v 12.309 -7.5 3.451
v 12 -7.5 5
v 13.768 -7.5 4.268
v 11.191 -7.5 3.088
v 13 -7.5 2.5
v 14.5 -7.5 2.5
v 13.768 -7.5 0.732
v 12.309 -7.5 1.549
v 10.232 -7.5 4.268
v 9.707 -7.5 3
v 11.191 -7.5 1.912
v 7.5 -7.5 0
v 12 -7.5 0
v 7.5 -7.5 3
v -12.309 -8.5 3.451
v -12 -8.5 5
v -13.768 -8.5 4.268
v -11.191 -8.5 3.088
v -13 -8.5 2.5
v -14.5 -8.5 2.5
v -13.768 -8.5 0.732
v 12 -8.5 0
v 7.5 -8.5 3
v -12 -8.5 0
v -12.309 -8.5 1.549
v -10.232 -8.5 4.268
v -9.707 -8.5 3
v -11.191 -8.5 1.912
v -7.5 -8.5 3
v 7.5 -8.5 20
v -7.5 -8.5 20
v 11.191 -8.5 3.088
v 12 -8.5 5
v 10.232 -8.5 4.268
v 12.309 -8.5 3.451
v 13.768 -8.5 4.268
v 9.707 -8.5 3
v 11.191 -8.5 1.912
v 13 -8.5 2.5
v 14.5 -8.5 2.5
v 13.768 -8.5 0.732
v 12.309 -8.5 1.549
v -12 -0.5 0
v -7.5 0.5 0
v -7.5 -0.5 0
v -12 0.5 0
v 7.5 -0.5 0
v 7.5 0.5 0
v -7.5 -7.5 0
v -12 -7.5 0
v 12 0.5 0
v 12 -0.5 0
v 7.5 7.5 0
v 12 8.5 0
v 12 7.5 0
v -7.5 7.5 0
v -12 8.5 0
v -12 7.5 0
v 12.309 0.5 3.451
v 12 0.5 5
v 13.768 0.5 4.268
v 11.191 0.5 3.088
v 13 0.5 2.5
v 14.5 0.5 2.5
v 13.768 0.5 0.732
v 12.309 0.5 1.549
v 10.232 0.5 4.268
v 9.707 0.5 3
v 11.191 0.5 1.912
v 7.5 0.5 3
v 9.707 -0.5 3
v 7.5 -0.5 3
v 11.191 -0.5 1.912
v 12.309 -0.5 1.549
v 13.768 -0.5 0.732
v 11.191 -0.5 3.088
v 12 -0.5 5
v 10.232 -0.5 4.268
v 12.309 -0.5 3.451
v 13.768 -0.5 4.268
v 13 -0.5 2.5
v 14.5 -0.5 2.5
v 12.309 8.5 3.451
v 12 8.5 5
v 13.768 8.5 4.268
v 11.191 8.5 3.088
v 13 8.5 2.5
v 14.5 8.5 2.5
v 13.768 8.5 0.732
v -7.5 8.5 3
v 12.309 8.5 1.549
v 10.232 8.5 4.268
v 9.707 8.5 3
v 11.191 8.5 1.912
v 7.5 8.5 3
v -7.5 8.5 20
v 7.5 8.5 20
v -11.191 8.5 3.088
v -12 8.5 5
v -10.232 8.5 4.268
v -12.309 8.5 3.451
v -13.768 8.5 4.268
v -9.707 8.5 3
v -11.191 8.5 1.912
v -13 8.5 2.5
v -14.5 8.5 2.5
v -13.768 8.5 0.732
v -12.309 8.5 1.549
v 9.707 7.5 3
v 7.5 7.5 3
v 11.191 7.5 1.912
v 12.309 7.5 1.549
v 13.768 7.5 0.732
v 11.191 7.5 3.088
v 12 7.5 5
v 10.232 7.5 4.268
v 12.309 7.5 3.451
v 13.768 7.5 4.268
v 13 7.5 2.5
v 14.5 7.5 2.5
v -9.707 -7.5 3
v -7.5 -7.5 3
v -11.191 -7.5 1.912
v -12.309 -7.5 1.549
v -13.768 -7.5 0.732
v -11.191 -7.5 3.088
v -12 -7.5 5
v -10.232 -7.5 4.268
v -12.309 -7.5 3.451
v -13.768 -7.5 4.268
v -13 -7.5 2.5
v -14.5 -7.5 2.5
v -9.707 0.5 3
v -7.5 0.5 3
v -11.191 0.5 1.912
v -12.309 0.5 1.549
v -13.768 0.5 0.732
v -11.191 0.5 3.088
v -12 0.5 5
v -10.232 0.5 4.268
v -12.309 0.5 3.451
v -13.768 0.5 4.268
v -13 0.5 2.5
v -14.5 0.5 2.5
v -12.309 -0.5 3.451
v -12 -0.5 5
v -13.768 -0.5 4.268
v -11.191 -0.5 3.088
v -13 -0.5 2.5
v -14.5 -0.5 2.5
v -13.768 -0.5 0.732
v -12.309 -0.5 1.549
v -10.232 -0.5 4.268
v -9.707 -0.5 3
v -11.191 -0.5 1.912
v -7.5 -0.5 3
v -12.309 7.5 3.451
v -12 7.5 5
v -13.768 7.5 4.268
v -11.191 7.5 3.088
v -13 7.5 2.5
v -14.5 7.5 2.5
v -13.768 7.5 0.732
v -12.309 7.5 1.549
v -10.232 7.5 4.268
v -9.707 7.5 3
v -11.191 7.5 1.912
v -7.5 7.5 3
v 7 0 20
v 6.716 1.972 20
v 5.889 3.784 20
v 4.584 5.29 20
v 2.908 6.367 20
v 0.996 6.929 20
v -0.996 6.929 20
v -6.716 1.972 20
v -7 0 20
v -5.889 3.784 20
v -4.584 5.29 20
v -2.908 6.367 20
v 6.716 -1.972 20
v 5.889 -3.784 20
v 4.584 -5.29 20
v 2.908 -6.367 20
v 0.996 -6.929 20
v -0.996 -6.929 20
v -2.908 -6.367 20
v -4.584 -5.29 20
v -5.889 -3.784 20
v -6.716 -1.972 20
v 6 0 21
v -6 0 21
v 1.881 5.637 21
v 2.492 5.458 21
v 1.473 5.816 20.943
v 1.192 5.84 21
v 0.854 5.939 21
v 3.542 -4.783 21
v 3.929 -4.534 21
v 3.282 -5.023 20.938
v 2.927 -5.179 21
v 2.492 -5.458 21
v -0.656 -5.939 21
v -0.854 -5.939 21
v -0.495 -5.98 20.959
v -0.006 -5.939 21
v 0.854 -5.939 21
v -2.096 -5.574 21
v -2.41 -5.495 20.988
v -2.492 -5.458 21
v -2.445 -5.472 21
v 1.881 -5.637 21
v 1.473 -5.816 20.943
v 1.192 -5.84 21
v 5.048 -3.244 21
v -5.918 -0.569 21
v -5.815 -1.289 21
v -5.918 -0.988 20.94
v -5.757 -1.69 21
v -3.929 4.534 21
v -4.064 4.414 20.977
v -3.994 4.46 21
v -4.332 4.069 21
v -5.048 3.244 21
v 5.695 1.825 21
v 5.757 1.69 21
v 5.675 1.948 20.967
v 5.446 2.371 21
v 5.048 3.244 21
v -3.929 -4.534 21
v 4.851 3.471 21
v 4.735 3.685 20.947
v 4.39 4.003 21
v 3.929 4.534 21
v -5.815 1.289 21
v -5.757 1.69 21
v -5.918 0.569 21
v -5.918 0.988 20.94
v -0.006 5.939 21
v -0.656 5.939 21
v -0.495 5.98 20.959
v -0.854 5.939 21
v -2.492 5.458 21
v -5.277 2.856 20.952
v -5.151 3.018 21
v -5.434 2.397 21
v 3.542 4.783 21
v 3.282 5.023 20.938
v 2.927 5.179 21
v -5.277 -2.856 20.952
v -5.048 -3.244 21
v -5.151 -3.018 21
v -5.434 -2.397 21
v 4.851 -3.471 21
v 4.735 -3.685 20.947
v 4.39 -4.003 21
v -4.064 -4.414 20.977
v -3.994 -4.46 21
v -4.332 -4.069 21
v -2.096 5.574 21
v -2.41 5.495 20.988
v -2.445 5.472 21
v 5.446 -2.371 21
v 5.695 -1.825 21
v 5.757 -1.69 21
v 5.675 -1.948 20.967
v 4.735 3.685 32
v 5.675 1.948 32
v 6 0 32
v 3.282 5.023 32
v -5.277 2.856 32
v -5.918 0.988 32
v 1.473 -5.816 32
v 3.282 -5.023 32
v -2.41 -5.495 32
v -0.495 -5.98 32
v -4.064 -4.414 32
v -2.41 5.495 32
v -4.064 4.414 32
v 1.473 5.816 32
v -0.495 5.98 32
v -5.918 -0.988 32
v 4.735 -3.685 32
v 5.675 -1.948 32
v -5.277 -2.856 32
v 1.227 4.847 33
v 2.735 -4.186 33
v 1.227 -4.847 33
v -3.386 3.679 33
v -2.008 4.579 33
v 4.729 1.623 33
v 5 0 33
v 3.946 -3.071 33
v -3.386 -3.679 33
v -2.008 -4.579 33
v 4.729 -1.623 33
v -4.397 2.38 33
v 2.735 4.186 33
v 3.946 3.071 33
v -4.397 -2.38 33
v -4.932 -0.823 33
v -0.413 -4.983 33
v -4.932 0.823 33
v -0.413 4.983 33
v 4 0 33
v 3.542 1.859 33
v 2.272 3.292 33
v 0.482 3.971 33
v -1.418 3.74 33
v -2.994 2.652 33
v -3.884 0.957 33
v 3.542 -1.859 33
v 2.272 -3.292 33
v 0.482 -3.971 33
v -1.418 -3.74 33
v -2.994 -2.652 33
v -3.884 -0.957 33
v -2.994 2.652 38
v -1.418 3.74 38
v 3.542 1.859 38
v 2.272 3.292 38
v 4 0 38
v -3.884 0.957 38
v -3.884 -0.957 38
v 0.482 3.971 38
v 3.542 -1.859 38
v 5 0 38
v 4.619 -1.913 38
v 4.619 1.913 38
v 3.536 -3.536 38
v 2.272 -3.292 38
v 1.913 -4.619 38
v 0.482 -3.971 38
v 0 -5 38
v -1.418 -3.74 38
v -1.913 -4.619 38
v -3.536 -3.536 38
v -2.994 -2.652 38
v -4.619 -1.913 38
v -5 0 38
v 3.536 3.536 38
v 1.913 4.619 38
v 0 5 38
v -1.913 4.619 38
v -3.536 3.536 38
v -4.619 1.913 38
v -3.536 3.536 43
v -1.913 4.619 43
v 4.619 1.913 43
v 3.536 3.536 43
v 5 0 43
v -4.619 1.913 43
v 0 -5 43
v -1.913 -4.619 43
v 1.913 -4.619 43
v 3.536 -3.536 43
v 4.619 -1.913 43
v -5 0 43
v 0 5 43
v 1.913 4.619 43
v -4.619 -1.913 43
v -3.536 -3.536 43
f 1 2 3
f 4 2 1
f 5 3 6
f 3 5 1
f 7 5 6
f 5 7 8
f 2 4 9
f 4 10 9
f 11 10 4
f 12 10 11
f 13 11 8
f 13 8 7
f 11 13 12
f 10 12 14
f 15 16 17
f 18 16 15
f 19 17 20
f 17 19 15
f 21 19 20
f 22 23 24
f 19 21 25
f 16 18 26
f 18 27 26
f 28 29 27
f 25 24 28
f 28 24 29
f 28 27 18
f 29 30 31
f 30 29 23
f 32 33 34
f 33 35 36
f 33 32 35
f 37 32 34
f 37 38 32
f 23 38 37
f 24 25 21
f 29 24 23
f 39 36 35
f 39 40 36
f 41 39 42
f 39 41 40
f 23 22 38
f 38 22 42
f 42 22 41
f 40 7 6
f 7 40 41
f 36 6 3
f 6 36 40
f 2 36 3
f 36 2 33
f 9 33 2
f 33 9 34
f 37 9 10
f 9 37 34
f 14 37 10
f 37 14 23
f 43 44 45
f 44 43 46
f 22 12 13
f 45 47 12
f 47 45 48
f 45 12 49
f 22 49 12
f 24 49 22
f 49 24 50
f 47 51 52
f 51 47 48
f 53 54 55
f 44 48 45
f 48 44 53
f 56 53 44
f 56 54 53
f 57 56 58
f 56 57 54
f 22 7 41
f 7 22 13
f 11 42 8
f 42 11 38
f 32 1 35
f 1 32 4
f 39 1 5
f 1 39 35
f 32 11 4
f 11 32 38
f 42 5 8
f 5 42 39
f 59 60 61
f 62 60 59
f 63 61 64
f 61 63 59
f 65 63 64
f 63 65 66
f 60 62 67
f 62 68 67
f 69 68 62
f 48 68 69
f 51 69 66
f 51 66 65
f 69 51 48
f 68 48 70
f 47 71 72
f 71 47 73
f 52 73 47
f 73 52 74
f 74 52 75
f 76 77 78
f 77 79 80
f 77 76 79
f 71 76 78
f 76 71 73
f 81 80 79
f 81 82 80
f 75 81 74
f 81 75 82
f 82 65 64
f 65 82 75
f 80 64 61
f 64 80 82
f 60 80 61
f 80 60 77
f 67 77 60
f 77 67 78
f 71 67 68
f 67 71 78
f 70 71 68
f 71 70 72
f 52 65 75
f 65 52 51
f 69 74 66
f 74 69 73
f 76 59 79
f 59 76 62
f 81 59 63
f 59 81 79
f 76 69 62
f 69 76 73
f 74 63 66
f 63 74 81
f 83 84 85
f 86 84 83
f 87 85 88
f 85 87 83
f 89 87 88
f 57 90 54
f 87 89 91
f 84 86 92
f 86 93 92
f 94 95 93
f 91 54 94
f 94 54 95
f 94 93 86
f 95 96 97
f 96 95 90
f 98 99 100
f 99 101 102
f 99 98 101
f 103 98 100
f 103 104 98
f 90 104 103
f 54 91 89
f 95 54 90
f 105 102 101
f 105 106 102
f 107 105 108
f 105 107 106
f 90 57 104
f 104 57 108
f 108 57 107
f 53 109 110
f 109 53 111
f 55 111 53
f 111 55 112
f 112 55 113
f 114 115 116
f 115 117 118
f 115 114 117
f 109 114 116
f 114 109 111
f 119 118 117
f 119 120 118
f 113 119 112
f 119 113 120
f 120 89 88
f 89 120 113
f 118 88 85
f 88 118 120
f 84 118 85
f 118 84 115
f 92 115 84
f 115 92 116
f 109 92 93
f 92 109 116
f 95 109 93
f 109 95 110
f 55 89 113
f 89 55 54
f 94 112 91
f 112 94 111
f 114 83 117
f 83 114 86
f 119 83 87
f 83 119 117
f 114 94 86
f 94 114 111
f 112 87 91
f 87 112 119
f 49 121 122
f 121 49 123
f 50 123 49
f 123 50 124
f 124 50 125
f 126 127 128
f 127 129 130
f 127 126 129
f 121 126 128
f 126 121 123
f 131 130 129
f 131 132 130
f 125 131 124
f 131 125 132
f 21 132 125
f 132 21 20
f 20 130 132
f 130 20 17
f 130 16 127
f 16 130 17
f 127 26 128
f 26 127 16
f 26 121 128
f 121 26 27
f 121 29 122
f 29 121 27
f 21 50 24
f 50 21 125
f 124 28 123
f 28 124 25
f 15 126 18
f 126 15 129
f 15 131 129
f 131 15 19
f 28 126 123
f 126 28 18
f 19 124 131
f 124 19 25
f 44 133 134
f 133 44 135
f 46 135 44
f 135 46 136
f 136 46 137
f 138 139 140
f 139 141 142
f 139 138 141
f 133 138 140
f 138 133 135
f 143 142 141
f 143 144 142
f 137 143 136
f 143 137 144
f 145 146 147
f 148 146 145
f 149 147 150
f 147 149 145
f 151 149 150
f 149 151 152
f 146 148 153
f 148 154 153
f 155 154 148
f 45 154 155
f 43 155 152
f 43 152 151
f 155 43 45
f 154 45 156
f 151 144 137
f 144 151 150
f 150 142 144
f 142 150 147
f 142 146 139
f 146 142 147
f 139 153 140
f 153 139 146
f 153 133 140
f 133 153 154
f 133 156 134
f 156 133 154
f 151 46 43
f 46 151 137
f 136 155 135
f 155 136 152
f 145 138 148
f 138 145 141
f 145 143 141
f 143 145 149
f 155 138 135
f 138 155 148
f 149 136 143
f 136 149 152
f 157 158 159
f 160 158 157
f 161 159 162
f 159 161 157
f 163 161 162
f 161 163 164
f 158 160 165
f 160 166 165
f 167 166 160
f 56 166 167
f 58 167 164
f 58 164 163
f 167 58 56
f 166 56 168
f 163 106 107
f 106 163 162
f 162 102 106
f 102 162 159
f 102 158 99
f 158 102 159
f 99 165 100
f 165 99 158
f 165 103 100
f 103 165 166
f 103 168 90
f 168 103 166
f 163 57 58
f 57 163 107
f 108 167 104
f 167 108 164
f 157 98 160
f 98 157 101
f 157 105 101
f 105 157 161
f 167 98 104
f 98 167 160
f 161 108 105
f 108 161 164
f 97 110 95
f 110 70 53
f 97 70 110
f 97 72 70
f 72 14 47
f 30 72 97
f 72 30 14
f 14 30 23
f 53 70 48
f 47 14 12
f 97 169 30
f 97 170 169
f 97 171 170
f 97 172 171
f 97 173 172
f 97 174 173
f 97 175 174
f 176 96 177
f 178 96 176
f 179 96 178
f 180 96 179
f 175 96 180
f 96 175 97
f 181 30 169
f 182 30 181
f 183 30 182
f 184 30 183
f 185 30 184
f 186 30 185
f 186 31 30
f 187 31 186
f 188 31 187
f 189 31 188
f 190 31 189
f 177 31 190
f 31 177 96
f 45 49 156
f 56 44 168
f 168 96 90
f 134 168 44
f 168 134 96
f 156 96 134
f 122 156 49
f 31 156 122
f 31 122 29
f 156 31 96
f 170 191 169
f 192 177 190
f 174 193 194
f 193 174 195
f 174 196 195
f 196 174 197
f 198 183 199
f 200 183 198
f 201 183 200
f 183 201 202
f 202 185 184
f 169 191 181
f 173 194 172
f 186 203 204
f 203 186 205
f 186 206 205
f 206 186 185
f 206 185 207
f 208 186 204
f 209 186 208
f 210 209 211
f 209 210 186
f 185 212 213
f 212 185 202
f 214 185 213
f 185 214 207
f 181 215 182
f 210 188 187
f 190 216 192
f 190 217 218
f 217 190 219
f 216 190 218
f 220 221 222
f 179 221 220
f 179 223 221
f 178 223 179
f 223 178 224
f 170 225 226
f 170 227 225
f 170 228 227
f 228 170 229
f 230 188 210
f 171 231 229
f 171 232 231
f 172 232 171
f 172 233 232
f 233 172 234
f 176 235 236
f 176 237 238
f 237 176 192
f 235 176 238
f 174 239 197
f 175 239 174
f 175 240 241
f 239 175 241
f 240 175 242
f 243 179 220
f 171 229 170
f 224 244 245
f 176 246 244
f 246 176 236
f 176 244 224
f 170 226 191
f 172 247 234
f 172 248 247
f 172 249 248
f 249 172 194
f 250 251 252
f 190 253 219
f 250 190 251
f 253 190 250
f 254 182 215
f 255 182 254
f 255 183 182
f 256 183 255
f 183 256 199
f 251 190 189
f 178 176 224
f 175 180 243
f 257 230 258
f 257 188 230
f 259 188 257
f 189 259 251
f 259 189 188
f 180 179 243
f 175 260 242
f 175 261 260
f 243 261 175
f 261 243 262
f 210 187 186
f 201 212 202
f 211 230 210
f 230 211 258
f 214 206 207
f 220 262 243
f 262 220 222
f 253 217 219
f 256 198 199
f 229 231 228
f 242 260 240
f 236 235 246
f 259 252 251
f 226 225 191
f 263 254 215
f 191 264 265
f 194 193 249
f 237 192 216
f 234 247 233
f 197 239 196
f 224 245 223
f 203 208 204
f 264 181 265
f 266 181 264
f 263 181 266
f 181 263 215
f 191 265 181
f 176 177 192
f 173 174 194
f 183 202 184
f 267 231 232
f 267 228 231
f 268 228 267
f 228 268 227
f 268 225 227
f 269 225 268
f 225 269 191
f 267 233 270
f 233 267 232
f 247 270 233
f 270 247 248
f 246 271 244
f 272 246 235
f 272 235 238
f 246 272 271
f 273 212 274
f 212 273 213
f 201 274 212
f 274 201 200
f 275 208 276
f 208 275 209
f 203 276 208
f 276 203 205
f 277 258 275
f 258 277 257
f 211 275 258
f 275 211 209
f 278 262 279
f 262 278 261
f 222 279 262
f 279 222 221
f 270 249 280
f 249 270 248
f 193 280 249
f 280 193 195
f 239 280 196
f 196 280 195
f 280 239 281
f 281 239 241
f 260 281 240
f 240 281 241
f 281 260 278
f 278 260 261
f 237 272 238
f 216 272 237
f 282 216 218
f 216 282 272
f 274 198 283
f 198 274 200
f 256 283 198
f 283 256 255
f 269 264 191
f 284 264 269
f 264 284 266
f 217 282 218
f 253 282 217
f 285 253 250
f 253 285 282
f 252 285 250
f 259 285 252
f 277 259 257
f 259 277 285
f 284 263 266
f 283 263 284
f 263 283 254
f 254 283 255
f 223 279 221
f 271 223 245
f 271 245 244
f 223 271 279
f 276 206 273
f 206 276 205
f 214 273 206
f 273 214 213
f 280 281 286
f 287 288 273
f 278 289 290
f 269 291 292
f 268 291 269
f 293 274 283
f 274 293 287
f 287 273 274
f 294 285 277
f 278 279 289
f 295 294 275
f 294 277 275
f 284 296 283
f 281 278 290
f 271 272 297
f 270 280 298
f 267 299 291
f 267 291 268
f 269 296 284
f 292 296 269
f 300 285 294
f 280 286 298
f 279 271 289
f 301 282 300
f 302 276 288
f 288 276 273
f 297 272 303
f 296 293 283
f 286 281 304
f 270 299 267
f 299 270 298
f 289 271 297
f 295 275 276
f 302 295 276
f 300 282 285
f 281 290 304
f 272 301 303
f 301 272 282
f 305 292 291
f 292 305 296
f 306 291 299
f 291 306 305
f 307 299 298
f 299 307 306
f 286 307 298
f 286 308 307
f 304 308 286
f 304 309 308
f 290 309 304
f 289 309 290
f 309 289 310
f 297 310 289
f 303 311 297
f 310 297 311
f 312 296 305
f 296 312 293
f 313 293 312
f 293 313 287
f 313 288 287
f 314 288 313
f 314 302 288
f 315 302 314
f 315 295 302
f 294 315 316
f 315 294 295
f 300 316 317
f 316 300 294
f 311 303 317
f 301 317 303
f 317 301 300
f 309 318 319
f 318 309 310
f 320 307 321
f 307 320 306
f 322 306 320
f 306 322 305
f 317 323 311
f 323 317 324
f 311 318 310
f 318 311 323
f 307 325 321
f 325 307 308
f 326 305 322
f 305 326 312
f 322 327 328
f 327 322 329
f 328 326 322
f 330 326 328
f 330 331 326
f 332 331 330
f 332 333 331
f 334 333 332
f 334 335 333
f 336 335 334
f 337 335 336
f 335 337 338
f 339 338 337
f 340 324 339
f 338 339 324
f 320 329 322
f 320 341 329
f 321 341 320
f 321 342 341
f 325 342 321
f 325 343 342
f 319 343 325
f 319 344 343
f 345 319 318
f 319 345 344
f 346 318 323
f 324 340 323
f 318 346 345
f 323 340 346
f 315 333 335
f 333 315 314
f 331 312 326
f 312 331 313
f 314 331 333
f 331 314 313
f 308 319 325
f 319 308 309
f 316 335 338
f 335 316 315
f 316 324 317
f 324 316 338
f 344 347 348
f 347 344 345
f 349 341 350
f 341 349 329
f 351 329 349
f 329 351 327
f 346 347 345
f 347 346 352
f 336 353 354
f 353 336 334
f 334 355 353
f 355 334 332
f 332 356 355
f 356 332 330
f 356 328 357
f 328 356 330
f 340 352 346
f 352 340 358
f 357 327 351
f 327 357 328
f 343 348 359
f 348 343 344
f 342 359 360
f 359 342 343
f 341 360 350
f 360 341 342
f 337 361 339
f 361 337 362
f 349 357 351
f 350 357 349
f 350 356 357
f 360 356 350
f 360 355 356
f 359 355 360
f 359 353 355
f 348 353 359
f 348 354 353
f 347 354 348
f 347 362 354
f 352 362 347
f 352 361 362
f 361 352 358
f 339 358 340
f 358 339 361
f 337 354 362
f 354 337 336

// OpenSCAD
module contact()
{
    rotate([90,0,0]) union()
    {
        difference()
        {
            union() linear_extrude(height =1,center=true)
            {
                square([5,3 ]);
                translate([5,5/2]) circle(d=5);
            }
            translate([5,5/2]) cylinder(d=2,h=2,center=true);
        }    
     }
 }

module footswitch()
 {
    translate([-15/2,-17/2,0]) cube([15,17,20]);
    translate([0,0,20]) cylinder(d1=14,d2=12,h=1);
    translate([0,0,10]) cylinder(d=12,h=12+10);
    translate([0,0,20+12]) cylinder(d1=12,d2=10,h=1);
    translate([0,0,10+13]) cylinder(d=8,h=5+10);
    translate ([0,0,20+13+5]) cylinder(d=10,h=5);
     
    mirror()
    {
        translate([7,-8,0]) contact();
        translate([7,0,0]) contact();
        translate([7,8,0]) contact();
    }
    {
        translate([7,-8,0]) contact();
        translate([7,0,0]) contact();
        translate([7,8,0]) contact();
    }
}

footswitch();
